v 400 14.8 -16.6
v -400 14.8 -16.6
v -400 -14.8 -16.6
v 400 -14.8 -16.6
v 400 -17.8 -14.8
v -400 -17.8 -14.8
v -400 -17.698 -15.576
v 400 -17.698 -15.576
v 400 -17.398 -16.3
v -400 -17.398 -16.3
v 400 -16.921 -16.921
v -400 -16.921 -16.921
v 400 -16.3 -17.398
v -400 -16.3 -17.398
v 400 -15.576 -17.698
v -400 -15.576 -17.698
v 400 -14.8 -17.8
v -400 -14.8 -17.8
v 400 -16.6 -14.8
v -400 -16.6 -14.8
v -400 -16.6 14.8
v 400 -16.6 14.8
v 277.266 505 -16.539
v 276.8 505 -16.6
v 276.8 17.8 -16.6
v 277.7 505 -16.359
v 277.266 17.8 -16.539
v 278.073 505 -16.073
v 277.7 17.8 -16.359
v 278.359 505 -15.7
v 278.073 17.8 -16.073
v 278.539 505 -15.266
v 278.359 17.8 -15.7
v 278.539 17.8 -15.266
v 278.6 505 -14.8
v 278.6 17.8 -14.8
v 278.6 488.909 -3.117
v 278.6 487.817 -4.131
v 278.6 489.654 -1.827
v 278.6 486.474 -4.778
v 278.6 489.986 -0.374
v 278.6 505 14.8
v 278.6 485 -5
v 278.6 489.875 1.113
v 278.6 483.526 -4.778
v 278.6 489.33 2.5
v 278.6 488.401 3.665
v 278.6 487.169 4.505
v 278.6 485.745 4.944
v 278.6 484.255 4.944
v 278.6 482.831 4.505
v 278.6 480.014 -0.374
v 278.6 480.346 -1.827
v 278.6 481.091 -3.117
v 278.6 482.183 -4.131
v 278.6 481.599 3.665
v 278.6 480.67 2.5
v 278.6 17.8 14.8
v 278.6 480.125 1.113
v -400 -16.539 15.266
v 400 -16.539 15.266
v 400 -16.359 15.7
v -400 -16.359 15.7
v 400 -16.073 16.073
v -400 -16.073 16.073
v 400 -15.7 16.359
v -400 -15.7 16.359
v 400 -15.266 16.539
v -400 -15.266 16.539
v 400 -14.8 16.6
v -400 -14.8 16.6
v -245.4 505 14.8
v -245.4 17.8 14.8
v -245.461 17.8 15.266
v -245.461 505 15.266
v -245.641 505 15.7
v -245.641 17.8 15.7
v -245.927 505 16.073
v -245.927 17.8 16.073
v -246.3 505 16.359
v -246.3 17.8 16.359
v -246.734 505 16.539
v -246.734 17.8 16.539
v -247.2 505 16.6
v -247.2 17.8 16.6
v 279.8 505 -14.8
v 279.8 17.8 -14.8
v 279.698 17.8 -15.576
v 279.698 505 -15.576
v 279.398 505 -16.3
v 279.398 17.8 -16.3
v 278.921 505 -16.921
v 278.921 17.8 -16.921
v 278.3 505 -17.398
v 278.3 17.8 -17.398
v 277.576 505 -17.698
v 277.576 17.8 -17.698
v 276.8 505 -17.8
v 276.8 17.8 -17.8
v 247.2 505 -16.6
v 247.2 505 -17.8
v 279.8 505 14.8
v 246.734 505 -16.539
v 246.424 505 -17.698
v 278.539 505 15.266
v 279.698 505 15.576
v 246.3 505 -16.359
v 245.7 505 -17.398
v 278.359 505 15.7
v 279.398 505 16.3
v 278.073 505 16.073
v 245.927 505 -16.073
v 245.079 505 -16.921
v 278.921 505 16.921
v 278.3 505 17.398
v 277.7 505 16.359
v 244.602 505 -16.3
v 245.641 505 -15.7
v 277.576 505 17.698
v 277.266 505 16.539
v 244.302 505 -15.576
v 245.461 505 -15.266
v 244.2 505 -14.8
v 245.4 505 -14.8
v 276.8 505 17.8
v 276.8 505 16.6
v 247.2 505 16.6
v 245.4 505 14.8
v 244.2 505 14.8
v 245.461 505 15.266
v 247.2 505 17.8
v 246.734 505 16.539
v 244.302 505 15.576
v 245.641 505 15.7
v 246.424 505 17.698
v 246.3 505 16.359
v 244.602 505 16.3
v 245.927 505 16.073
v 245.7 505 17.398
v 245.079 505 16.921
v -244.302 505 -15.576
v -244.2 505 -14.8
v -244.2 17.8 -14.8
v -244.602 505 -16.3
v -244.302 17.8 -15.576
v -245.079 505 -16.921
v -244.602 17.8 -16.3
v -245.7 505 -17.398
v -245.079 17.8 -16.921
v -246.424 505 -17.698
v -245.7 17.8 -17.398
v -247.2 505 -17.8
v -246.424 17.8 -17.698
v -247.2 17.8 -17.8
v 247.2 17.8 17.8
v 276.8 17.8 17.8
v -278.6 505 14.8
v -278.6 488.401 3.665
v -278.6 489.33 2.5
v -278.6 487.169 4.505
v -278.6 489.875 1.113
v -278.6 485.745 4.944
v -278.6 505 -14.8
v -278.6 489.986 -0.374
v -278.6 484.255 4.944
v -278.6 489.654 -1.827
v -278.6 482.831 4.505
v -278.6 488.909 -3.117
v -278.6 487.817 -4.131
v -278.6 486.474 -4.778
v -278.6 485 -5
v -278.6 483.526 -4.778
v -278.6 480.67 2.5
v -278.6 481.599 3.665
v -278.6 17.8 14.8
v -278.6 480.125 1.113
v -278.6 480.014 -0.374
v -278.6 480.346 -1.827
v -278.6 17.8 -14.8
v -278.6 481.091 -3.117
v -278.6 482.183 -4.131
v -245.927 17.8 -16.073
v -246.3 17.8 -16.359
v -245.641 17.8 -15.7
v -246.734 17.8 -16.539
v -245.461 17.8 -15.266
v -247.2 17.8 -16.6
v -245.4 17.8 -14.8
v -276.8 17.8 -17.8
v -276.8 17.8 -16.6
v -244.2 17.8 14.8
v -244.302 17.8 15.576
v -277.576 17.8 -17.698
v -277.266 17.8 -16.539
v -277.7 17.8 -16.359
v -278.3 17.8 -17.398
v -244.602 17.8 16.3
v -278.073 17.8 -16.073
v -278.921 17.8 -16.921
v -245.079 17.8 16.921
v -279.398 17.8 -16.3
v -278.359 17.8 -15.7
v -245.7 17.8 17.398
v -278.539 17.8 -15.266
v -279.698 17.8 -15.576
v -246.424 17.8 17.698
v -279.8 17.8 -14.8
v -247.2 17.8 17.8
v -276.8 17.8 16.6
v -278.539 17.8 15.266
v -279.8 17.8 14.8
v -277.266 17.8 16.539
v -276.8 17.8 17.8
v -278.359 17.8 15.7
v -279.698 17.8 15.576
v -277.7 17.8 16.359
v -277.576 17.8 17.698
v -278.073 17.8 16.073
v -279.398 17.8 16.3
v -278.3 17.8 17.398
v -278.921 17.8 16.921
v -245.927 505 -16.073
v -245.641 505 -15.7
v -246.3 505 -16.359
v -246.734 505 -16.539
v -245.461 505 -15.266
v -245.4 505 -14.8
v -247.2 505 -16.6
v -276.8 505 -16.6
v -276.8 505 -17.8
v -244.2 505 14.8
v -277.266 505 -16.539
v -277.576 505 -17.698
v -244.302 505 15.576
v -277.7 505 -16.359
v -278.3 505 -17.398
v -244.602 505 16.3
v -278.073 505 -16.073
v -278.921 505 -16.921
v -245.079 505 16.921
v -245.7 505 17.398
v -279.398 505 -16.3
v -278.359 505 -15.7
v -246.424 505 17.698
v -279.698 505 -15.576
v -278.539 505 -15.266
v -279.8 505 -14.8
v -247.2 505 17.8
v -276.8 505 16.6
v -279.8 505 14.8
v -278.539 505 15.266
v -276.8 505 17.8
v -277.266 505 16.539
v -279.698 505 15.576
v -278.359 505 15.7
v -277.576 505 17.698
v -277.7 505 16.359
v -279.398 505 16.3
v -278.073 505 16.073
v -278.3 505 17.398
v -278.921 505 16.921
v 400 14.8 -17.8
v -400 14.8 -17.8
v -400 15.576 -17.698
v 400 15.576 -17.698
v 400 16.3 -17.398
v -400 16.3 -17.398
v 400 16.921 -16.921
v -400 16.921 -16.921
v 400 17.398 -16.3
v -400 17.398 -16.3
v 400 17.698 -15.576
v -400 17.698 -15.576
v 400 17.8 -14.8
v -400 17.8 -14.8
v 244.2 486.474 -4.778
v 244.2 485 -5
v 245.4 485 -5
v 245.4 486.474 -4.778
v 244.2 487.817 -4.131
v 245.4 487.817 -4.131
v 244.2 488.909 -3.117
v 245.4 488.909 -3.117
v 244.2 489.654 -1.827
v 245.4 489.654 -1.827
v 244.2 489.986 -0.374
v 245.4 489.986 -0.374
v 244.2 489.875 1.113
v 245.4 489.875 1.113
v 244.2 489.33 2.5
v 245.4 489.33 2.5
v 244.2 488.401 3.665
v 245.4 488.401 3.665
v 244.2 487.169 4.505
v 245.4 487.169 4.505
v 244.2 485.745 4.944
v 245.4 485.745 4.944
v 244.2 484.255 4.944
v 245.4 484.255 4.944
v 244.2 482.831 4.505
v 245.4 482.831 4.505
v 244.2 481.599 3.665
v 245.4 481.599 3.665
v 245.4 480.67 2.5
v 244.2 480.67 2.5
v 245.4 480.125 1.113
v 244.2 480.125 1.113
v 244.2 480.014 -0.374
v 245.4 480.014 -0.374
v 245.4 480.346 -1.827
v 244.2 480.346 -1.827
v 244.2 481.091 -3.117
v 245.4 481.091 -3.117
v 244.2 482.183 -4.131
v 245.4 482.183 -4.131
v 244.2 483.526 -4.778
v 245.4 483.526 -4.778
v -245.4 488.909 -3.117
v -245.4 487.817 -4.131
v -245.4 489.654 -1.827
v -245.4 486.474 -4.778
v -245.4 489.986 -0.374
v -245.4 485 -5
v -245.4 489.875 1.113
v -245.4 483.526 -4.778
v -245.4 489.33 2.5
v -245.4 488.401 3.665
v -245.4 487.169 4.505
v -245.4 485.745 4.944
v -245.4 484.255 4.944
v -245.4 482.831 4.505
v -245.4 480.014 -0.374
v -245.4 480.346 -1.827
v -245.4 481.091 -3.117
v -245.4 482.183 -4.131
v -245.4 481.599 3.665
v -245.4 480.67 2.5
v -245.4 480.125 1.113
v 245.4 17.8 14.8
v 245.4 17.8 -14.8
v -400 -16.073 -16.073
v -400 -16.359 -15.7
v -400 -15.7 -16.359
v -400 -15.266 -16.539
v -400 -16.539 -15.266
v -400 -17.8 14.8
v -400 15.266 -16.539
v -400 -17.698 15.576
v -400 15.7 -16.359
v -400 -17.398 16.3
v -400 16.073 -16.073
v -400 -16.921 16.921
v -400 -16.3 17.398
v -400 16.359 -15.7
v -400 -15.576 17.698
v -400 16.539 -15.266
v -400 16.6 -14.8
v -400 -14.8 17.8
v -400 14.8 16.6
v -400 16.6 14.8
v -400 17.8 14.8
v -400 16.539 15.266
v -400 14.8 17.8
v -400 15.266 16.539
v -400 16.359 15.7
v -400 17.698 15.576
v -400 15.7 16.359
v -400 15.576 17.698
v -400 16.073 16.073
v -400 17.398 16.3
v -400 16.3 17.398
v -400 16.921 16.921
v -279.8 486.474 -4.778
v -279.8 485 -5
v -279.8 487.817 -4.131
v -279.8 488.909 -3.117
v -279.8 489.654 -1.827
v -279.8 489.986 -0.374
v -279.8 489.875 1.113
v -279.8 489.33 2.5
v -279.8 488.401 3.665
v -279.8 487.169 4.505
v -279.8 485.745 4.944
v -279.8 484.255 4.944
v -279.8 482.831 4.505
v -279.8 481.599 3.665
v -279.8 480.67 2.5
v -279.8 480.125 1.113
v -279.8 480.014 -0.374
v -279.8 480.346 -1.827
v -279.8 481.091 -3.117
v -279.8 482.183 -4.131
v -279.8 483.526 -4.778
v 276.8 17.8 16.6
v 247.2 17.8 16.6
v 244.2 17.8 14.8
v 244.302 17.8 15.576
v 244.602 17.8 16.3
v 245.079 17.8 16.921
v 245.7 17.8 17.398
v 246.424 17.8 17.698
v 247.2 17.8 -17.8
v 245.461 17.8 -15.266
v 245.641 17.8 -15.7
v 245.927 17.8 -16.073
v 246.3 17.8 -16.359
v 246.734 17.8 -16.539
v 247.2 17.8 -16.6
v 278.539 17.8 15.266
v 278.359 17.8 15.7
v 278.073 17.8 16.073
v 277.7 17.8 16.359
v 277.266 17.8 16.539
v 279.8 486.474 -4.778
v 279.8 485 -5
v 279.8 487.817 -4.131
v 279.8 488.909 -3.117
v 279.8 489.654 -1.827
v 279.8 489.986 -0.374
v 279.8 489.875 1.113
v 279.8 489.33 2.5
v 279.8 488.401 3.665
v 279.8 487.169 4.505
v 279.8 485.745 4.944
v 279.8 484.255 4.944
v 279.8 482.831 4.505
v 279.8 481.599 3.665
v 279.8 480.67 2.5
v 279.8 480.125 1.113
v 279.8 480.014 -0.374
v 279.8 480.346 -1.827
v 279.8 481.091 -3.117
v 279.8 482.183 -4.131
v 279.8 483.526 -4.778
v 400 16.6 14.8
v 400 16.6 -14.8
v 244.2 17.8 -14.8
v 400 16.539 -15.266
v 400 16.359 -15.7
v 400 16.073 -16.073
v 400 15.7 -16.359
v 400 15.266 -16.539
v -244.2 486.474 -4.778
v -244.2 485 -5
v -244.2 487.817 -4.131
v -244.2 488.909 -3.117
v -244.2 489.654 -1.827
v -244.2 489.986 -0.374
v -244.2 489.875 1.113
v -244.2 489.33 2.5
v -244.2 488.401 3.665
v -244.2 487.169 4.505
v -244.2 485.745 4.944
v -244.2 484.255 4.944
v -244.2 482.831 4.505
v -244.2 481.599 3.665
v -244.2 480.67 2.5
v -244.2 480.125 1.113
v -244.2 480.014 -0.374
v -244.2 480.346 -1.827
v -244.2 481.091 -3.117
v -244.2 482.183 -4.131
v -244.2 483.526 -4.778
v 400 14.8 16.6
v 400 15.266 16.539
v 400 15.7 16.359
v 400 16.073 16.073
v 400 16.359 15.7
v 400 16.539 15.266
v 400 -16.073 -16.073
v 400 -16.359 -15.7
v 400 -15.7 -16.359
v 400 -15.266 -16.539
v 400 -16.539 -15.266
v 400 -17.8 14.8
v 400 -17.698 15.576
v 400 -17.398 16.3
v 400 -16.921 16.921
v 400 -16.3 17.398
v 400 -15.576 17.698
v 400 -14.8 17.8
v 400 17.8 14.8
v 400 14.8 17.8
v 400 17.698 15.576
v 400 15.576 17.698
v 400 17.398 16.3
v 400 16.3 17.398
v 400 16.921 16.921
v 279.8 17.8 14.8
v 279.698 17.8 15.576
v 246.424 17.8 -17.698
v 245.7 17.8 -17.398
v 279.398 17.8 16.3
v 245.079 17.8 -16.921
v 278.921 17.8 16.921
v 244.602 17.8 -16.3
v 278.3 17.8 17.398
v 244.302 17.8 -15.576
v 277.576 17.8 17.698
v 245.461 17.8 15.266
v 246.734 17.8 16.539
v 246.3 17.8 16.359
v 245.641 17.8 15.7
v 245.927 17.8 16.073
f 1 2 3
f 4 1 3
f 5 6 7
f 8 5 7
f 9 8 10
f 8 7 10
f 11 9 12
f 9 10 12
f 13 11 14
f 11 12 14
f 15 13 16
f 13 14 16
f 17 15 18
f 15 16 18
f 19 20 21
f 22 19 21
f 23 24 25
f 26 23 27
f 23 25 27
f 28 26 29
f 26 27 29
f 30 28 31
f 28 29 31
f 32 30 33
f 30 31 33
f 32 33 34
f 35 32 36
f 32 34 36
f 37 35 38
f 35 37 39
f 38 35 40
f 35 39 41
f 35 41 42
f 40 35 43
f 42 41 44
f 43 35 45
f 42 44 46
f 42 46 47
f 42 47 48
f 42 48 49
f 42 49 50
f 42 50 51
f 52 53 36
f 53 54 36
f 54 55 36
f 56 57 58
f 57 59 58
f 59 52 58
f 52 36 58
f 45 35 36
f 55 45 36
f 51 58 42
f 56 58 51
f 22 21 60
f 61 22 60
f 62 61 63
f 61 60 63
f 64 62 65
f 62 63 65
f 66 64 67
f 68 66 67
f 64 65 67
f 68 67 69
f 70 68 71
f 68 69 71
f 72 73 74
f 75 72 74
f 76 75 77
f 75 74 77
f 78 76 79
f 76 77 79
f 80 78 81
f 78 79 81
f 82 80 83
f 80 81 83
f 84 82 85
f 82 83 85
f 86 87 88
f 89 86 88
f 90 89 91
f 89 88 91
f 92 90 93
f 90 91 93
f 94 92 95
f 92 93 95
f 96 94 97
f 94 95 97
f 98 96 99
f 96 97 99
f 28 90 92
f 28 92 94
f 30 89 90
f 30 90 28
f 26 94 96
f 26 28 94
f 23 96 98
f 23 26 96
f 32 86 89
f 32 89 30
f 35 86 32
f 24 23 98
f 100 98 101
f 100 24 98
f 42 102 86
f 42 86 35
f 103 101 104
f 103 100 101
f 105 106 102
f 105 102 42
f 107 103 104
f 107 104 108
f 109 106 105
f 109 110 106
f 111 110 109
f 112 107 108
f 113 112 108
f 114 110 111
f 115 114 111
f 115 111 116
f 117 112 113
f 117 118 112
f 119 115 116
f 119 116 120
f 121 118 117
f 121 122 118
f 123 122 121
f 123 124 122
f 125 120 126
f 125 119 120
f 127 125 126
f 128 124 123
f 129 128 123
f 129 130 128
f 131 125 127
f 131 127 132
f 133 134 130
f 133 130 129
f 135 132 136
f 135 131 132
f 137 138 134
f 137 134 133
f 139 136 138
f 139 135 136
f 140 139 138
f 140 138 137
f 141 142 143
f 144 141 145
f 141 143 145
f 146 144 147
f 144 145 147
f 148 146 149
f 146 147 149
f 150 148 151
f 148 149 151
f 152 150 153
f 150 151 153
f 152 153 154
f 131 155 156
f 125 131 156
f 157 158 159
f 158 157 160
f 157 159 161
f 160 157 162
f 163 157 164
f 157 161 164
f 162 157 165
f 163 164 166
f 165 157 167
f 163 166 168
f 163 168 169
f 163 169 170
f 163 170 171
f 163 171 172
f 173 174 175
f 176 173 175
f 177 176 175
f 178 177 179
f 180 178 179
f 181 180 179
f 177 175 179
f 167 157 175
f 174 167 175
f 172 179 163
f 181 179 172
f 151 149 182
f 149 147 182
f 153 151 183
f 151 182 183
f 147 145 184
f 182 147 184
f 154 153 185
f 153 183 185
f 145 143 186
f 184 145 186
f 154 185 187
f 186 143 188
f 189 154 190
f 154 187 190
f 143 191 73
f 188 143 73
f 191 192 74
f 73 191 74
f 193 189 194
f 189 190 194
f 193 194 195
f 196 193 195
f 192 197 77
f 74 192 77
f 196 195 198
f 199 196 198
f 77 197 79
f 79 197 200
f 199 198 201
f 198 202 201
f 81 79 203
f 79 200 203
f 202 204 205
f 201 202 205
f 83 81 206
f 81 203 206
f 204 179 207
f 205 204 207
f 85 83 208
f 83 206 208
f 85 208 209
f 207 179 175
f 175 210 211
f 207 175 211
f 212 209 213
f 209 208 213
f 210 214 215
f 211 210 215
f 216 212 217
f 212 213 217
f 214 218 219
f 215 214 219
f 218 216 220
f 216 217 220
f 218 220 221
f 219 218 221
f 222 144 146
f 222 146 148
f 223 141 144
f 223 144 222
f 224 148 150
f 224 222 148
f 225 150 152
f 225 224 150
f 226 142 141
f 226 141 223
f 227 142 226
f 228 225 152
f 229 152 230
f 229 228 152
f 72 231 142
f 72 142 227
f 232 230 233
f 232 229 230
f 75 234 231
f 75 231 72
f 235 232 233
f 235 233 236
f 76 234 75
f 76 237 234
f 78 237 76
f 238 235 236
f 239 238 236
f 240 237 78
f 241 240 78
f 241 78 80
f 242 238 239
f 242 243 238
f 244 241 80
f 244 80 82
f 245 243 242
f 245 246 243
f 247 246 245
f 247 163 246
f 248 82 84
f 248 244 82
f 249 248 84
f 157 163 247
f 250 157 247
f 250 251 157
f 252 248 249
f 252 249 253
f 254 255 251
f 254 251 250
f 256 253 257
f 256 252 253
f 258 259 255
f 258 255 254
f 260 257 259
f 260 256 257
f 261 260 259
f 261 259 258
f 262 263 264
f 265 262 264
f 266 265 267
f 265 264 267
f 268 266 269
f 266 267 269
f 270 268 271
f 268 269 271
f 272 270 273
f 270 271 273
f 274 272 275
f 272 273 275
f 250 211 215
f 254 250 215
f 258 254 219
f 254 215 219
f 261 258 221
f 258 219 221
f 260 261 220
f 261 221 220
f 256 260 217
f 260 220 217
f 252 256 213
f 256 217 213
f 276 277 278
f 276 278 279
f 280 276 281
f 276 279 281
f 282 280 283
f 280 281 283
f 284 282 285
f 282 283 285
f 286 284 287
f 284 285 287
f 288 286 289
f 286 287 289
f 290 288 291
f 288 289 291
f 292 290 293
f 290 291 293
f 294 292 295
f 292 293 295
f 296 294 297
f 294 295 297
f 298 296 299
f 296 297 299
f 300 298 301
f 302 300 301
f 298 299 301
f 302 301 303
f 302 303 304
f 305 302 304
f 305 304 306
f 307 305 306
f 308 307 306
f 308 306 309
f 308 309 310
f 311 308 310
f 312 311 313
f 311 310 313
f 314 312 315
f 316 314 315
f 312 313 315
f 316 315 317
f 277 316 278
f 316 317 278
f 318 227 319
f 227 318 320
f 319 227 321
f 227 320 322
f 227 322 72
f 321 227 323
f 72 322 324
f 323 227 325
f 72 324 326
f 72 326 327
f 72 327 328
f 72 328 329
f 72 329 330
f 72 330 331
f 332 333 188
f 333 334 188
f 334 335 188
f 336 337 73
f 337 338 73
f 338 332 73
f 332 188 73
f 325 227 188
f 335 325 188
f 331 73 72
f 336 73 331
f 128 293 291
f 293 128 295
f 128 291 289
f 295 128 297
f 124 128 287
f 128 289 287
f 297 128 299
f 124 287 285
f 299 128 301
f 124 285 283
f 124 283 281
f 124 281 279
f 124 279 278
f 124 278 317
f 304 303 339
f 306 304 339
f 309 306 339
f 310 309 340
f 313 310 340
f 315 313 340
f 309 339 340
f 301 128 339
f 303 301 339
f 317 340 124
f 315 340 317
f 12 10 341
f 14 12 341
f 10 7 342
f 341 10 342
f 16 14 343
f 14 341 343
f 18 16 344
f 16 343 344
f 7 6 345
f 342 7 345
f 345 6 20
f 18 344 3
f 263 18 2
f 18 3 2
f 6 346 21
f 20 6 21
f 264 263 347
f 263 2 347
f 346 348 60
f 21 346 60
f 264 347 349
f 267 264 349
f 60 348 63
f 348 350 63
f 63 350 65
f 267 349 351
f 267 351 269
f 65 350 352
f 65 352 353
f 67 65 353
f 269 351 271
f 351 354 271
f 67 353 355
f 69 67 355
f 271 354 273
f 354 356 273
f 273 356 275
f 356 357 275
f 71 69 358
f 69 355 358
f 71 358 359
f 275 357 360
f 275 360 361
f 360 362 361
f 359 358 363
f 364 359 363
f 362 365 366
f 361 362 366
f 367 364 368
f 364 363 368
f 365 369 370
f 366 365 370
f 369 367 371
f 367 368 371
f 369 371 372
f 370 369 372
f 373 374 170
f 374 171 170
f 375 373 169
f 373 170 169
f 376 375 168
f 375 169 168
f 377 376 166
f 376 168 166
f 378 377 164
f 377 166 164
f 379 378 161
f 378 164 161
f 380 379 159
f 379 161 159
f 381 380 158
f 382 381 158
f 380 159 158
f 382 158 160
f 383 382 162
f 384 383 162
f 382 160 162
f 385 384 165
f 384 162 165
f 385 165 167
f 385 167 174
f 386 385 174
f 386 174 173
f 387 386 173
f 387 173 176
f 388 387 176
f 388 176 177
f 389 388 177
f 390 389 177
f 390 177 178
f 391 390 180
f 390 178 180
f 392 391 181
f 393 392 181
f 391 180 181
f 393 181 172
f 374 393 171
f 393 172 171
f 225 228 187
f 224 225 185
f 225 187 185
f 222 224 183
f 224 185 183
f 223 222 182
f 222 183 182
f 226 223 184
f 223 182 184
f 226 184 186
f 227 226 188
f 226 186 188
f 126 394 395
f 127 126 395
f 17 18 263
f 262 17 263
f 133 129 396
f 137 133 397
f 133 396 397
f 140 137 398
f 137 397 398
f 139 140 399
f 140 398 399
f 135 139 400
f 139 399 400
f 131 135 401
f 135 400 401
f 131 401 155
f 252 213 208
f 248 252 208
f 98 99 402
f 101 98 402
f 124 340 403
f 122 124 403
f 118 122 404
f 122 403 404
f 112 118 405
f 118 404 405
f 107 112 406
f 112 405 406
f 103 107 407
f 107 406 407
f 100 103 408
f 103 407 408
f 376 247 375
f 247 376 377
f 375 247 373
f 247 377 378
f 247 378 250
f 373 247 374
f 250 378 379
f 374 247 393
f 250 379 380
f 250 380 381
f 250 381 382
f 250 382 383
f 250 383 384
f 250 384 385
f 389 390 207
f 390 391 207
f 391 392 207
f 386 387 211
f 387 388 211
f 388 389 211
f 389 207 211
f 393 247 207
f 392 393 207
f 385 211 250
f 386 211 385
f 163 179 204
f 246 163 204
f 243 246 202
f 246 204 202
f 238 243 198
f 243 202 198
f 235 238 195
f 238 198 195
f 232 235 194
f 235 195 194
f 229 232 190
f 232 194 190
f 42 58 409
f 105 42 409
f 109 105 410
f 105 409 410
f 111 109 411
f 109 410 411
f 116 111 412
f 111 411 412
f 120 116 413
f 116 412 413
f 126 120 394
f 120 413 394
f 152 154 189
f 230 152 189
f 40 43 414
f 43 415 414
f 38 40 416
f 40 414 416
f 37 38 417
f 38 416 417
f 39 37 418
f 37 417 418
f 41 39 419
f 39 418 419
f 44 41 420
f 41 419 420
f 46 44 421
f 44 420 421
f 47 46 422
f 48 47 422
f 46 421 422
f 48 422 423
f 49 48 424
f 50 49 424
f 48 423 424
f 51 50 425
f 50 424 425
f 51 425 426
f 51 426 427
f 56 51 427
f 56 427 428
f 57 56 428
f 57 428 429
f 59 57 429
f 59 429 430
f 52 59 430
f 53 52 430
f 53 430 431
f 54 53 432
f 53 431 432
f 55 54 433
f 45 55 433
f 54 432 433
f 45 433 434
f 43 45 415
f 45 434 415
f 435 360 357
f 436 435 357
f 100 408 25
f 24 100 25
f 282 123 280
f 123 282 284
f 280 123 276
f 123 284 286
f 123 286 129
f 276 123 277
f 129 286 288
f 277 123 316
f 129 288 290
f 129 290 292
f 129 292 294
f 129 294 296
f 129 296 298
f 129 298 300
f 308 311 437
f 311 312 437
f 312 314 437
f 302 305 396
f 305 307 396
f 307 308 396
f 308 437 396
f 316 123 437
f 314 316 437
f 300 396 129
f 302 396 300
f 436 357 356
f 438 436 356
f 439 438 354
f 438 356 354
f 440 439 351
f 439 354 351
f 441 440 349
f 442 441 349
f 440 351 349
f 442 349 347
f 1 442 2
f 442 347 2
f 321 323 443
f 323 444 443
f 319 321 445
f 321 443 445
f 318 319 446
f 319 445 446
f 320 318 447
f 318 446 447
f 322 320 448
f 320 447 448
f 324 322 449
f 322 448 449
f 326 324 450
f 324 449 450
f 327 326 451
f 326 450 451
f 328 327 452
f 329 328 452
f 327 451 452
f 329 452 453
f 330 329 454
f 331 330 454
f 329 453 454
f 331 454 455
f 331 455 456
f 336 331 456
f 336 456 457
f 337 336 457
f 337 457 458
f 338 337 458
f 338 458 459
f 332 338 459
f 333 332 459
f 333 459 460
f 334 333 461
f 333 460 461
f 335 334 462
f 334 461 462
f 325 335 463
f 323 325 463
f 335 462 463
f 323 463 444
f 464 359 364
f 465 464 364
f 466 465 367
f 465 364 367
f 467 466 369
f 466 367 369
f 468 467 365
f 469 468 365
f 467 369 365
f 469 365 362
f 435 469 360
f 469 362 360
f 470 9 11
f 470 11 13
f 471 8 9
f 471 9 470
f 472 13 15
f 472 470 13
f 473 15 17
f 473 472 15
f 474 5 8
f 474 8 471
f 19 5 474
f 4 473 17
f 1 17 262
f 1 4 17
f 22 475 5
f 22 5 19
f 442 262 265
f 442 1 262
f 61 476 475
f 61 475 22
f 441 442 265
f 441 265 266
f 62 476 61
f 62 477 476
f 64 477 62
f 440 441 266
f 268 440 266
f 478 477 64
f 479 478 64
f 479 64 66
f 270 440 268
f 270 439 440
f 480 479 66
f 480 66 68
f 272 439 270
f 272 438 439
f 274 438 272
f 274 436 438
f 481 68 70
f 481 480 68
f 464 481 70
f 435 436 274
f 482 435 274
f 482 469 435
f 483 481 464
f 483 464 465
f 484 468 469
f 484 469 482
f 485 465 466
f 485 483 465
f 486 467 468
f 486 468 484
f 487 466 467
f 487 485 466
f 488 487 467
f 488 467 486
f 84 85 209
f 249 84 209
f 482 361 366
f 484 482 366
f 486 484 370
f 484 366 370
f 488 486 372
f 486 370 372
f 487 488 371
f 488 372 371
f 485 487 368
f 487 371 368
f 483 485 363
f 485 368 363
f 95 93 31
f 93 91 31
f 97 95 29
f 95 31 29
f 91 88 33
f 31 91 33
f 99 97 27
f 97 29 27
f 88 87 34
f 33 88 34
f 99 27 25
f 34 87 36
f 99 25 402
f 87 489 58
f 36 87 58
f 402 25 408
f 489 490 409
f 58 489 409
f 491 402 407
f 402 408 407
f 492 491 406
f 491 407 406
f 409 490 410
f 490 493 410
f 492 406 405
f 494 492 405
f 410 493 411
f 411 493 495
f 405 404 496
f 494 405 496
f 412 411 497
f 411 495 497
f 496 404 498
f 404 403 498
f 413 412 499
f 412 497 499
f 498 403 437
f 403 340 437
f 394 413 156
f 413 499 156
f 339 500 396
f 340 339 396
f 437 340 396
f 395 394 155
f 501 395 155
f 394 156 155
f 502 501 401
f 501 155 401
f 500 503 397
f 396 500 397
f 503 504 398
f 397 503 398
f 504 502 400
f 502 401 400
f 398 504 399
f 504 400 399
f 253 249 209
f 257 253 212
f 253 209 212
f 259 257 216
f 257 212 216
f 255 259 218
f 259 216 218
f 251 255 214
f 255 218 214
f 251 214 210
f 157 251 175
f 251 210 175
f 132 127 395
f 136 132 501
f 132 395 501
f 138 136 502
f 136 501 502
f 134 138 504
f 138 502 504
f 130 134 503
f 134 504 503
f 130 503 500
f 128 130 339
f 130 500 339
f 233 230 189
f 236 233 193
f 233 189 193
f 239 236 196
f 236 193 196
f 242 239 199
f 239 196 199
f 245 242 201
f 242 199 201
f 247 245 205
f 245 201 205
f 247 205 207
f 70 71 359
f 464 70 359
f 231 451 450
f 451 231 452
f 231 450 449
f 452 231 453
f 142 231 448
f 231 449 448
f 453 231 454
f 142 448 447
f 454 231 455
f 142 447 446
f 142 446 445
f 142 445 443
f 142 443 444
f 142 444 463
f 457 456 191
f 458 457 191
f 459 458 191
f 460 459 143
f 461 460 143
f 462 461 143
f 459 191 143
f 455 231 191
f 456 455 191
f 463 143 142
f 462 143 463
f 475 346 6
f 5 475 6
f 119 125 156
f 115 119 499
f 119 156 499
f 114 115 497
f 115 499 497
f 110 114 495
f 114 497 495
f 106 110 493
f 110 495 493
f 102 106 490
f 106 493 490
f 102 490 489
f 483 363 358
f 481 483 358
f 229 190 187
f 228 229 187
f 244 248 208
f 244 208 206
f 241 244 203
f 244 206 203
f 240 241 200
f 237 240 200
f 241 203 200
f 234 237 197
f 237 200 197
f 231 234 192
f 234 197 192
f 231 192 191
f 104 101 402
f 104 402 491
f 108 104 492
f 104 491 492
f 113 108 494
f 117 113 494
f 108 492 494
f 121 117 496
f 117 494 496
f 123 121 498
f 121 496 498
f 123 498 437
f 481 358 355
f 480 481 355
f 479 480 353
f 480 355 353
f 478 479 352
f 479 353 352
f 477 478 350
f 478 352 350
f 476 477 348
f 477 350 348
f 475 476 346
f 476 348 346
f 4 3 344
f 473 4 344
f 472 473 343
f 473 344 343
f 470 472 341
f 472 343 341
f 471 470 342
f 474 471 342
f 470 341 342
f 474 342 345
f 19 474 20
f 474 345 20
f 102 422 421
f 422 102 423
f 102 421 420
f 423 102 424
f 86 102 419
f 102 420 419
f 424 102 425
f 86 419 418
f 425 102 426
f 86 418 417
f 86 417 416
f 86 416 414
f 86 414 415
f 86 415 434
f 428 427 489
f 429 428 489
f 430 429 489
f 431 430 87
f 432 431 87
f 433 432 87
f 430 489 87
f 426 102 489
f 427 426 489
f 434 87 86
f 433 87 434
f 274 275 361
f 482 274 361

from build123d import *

# Parameters (mm, degrees)
STRUCTURAL_MEMBER1_DEPTH   = 800
STRUCTURAL_MEMBER1_2_DEPTH = 506
STRUCTURAL_MEMBER1_3_DEPTH = 506
SKETCH12_R                 = 5
CUT_EXTRUDE2_DEPTH         = 645.470201018
CUT_EXTRUDE2_DEPTH_BACK    = 645.470201018


with BuildPart() as part:
    # Sketch11 → Structural Member1 (new body)
    with BuildSketch(Plane.YZ.offset(-400)):
        with BuildLine():
            Line((-14.8, -17.8), (14.8, -17.8))
            ThreePointArc((14.8, -17.8), (16.921320344, -16.921320344), (17.8, -14.8))
            Line((17.8, -14.8), (17.8, 14.8))
            ThreePointArc((17.8, 14.8), (16.921320344, 16.921320344), (14.8, 17.8))
            Line((14.8, 17.8), (-14.8, 17.8))
            ThreePointArc((-14.8, 17.8), (-16.921320344, 16.921320344), (-17.8, 14.8))
            Line((-17.8, 14.8), (-17.8, -14.8))
            ThreePointArc((-17.8, -14.8), (-16.921320344, -16.921320344), (-14.8, -17.8))
        make_face()
        with BuildLine():
            Line((-14.8, 16.6), (14.8, 16.6))
            ThreePointArc((14.8, 16.6), (16.072792206, 16.072792206), (16.6, 14.8))
            Line((16.6, 14.8), (16.6, -14.8))
            ThreePointArc((16.6, -14.8), (16.072792206, -16.072792206), (14.8, -16.6))
            Line((14.8, -16.6), (-14.8, -16.6))
            ThreePointArc((-14.8, -16.6), (-16.072792206, -16.072792206), (-16.6, -14.8))
            Line((-16.6, -14.8), (-16.6, 14.8))
            ThreePointArc((-16.6, 14.8), (-16.072792206, 16.072792206), (-14.8, 16.6))
        make_face(mode=Mode.SUBTRACT)
    extrude(amount=STRUCTURAL_MEMBER1_DEPTH)


with BuildPart() as body_2:
    # Sketch11 on segment 2 (carried to segment 2) → Structural Member1 2 (new body)
    with BuildSketch(Plane(origin=(-262, -1, 0), x_dir=(-1, 0, 0), z_dir=(0, 1, 0))):
        with BuildLine():
            Line((-14.8, -17.8), (14.8, -17.8))
            ThreePointArc((14.8, -17.8), (16.921320344, -16.921320344), (17.8, -14.8))
            Line((17.8, -14.8), (17.8, 14.8))
            ThreePointArc((17.8, 14.8), (16.921320344, 16.921320344), (14.8, 17.8))
            Line((14.8, 17.8), (-14.8, 17.8))
            ThreePointArc((-14.8, 17.8), (-16.921320344, 16.921320344), (-17.8, 14.8))
            Line((-17.8, 14.8), (-17.8, -14.8))
            ThreePointArc((-17.8, -14.8), (-16.921320344, -16.921320344), (-14.8, -17.8))
        make_face()
        with BuildLine():
            Line((-14.8, 16.6), (14.8, 16.6))
            ThreePointArc((14.8, 16.6), (16.072792206, 16.072792206), (16.6, 14.8))
            Line((16.6, 14.8), (16.6, -14.8))
            ThreePointArc((16.6, -14.8), (16.072792206, -16.072792206), (14.8, -16.6))
            Line((14.8, -16.6), (-14.8, -16.6))
            ThreePointArc((-14.8, -16.6), (-16.072792206, -16.072792206), (-16.6, -14.8))
            Line((-16.6, -14.8), (-16.6, 14.8))
            ThreePointArc((-16.6, 14.8), (-16.072792206, 16.072792206), (-14.8, 16.6))
        make_face(mode=Mode.SUBTRACT)
    extrude(amount=STRUCTURAL_MEMBER1_2_DEPTH)

    # Structural Member1 2 end butt 1
    split(bisect_by=Plane(origin=(-262, 17.8, 0), x_dir=(-1, 0, 0), z_dir=(0, 1, 0)), keep=Keep.TOP)


with BuildPart() as body_3:
    # Sketch11 on segment 3 (carried to segment 3) → Structural Member1 3 (new body)
    with BuildSketch(Plane(origin=(262, -1, 0), x_dir=(-1, 0, 0), z_dir=(0, 1, 0))):
        with BuildLine():
            Line((-14.8, -17.8), (14.8, -17.8))
            ThreePointArc((14.8, -17.8), (16.921320344, -16.921320344), (17.8, -14.8))
            Line((17.8, -14.8), (17.8, 14.8))
            ThreePointArc((17.8, 14.8), (16.921320344, 16.921320344), (14.8, 17.8))
            Line((14.8, 17.8), (-14.8, 17.8))
            ThreePointArc((-14.8, 17.8), (-16.921320344, 16.921320344), (-17.8, 14.8))
            Line((-17.8, 14.8), (-17.8, -14.8))
            ThreePointArc((-17.8, -14.8), (-16.921320344, -16.921320344), (-14.8, -17.8))
        make_face()
        with BuildLine():
            Line((-14.8, 16.6), (14.8, 16.6))
            ThreePointArc((14.8, 16.6), (16.072792206, 16.072792206), (16.6, 14.8))
            Line((16.6, 14.8), (16.6, -14.8))
            ThreePointArc((16.6, -14.8), (16.072792206, -16.072792206), (14.8, -16.6))
            Line((14.8, -16.6), (-14.8, -16.6))
            ThreePointArc((-14.8, -16.6), (-16.072792206, -16.072792206), (-16.6, -14.8))
            Line((-16.6, -14.8), (-16.6, 14.8))
            ThreePointArc((-16.6, 14.8), (-16.072792206, 16.072792206), (-14.8, 16.6))
        make_face(mode=Mode.SUBTRACT)
    extrude(amount=STRUCTURAL_MEMBER1_3_DEPTH)

    # Structural Member1 3 end butt 1
    split(bisect_by=Plane(origin=(262, 17.8, 0), x_dir=(-1, 0, 0), z_dir=(0, 1, 0)), keep=Keep.TOP)


with BuildPart() as cut_extrude2_tool:
    # Sketch12 → Cut-Extrude2 (new, two sides)
    with BuildSketch(Plane(origin=(0, 0, 0), x_dir=(0, 0, -1), z_dir=(1, 0, 0))) as cut_extrude2_sk:
        with Locations((0, 485)):
            Circle(SKETCH12_R)
    extrude(amount=CUT_EXTRUDE2_DEPTH)
    extrude(cut_extrude2_sk.sketch, amount=-CUT_EXTRUDE2_DEPTH_BACK)


with BuildPart() as body_2_1:
    add(body_2.part)

    # Cut-Extrude2: cut by cut_extrude2_tool
    add(cut_extrude2_tool.part, mode=Mode.SUBTRACT)


with BuildPart() as body_3_1:
    add(body_3.part)

    # Cut-Extrude2: cut by cut_extrude2_tool
    add(cut_extrude2_tool.part, mode=Mode.SUBTRACT)


solid = Compound([part.part, body_2_1.part, body_3_1.part])
